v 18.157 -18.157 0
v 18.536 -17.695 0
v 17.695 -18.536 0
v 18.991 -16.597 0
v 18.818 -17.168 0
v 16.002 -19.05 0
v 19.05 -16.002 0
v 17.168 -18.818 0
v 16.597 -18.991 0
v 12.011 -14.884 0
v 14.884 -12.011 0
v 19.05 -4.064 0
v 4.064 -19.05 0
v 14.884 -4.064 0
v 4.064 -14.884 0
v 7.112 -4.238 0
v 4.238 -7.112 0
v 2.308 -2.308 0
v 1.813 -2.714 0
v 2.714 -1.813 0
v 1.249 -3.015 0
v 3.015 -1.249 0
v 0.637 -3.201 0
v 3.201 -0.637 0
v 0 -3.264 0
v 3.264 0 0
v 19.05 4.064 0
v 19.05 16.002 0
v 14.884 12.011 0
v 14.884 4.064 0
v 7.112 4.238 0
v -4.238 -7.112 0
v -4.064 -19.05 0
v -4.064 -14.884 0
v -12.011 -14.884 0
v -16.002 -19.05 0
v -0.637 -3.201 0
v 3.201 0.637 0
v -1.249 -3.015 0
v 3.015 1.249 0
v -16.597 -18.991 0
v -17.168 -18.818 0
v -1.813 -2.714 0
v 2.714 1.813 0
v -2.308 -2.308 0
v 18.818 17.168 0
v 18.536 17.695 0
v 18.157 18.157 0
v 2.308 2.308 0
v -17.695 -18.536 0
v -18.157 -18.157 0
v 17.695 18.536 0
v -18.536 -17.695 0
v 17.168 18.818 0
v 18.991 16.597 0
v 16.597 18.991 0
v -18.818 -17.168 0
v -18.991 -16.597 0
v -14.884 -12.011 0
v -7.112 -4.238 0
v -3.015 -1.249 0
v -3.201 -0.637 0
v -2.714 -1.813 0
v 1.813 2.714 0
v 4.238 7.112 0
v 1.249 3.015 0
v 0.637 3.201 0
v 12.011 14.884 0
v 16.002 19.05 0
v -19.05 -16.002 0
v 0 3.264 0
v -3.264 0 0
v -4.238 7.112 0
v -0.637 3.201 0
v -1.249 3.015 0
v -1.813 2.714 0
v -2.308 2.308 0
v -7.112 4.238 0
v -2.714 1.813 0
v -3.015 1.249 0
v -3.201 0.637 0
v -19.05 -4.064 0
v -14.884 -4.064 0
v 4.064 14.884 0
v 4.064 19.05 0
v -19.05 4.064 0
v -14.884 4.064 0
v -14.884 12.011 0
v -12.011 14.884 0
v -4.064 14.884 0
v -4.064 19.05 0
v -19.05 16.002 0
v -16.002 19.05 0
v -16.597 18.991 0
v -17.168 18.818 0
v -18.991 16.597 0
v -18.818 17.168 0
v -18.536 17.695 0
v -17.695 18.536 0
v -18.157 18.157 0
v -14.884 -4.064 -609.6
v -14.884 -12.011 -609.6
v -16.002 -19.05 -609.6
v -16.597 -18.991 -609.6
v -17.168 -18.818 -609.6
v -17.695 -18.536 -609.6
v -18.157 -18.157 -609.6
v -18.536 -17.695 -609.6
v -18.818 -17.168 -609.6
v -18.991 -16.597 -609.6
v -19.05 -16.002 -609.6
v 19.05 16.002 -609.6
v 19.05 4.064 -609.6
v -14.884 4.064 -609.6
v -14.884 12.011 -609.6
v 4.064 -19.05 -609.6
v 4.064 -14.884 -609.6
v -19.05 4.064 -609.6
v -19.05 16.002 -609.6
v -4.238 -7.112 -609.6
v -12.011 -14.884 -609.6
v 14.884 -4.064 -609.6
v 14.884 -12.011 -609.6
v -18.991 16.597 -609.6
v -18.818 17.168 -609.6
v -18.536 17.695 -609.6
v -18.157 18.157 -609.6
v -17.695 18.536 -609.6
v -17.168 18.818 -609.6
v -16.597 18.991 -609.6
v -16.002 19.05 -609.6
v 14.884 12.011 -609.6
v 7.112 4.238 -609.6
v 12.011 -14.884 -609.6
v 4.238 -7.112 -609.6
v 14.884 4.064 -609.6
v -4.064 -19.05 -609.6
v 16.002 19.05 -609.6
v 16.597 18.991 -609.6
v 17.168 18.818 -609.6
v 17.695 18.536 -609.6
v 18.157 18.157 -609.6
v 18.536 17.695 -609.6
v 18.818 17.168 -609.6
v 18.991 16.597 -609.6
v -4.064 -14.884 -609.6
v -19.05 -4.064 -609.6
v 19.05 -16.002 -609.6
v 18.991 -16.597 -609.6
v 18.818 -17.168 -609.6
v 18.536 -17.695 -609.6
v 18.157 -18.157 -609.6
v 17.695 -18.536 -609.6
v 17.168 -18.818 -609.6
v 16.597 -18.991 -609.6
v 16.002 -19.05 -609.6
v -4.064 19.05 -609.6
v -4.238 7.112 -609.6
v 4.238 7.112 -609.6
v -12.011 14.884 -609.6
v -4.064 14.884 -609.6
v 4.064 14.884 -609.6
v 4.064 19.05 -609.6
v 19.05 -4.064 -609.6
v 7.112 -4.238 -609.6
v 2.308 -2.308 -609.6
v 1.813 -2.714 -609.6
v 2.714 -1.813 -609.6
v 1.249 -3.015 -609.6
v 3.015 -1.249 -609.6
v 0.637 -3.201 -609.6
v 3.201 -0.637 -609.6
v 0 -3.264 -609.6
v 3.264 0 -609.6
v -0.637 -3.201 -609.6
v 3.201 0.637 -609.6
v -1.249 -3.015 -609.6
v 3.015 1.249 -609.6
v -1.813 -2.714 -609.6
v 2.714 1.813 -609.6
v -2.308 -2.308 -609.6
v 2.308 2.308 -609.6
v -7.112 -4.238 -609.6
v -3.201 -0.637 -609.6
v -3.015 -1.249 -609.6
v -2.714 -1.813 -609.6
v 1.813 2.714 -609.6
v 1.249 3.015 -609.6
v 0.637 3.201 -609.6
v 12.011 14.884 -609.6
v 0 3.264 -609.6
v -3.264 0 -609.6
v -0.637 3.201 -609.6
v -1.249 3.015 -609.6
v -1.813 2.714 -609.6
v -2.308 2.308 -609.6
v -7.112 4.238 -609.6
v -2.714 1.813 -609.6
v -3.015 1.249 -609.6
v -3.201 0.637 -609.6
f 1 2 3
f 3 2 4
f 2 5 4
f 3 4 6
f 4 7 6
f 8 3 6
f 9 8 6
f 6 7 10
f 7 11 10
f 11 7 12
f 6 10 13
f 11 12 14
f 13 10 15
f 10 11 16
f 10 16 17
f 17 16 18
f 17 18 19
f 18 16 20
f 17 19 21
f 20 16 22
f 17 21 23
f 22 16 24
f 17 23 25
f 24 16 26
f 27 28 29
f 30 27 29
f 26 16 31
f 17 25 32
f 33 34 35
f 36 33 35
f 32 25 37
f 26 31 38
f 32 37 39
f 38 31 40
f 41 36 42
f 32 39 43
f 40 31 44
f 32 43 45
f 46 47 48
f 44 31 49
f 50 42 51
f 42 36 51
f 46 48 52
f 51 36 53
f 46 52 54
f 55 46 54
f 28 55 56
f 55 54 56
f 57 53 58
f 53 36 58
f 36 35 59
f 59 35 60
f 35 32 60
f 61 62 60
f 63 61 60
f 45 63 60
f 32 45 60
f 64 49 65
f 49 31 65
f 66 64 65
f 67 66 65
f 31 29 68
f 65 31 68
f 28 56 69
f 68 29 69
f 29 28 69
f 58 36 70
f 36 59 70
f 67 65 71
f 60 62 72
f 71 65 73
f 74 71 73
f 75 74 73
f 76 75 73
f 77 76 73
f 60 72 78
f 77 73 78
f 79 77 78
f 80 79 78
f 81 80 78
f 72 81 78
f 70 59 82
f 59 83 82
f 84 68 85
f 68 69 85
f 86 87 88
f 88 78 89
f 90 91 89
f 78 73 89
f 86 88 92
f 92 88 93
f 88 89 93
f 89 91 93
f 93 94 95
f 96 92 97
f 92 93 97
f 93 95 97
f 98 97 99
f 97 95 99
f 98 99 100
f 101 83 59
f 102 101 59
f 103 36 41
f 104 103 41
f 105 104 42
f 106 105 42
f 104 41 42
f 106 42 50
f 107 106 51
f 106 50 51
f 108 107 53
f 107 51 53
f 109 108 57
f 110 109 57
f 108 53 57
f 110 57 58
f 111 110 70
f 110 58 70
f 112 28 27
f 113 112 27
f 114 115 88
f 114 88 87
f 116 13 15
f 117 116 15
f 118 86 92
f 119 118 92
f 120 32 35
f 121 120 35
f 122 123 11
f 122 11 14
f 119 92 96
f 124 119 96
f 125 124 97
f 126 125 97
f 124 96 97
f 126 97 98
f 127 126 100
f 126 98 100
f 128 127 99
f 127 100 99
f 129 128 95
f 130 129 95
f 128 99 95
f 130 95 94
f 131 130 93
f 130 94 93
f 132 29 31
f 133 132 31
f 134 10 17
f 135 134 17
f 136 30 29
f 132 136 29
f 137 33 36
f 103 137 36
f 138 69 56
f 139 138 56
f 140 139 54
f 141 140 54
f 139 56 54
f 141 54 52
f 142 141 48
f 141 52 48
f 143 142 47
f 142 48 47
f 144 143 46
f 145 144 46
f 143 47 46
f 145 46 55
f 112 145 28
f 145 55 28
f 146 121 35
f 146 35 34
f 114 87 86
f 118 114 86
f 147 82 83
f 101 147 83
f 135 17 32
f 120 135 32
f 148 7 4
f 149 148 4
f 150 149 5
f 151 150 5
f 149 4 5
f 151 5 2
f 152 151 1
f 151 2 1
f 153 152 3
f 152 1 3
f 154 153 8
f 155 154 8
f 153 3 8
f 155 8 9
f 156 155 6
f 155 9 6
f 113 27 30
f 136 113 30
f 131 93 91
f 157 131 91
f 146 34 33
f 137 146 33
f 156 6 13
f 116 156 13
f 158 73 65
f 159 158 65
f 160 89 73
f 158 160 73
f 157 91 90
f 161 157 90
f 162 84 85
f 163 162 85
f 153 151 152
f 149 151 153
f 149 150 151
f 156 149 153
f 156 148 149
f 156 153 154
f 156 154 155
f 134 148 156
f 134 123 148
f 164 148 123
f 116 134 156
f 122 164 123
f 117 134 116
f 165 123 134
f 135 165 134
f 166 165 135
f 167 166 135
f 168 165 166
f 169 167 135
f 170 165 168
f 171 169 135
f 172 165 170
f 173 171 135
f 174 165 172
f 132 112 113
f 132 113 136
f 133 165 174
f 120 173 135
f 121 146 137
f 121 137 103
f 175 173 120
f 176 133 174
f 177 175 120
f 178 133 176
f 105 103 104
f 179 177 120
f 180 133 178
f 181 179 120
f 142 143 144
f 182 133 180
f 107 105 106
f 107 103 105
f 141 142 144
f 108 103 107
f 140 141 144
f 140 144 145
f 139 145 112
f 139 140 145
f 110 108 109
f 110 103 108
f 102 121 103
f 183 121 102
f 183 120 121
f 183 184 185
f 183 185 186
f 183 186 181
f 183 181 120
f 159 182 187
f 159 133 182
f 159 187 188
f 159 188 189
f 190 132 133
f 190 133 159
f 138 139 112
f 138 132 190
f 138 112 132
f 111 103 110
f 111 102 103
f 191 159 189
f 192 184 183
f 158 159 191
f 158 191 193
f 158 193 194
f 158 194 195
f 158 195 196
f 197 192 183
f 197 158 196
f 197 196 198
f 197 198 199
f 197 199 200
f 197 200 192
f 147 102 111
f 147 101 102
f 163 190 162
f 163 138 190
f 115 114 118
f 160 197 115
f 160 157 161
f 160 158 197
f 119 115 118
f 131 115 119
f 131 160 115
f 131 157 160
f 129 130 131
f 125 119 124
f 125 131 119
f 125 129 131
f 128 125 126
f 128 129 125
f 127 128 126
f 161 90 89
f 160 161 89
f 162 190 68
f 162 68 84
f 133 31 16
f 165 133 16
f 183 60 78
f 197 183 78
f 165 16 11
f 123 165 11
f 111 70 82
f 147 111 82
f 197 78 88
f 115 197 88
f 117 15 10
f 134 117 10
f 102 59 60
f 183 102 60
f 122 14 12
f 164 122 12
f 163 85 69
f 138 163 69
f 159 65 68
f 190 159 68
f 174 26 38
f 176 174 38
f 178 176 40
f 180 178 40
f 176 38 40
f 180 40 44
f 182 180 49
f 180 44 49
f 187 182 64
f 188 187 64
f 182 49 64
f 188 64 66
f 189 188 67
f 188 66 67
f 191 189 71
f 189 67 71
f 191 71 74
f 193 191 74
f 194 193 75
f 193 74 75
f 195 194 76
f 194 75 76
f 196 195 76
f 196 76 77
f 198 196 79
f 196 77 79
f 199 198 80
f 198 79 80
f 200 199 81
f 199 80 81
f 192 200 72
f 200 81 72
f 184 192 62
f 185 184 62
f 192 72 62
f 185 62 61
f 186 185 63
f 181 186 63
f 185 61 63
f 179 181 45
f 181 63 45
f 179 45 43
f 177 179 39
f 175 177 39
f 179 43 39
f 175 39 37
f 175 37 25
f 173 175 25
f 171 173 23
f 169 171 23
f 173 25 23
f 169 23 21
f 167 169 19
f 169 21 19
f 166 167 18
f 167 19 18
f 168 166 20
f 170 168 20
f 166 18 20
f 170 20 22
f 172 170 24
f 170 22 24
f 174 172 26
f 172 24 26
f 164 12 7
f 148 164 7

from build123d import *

# Parameters (mm, degrees)
SKETCH1_R      = 3.2639
FINALCUT_DEPTH = 609.6


with BuildPart() as part:
    # Sketch1 → FinalCut (new body)
    with BuildSketch(Plane.XY):
        with BuildLine():
            Line((-7.112, 0), (-7.112, 4.238318041))
            Line((-7.112, 4.238318041), (-14.8844, 12.010718041))
            Line((-14.8844, 12.010718041), (-14.8844, 4.064))
            Line((-14.8844, 4.064), (-19.05, 4.064))
            Line((-19.05, 4.064), (-19.05, 16.002))
            ThreePointArc((-19.05, 16.002), (-18.157261469, 18.157261469), (-16.002, 19.05))
            Line((-16.002, 19.05), (-4.064, 19.05))
            Line((-4.064, 19.05), (-4.064, 14.8844))
            Line((-4.064, 14.8844), (-12.010718041, 14.8844))
            Line((-12.010718041, 14.8844), (-4.238318041, 7.112))
            Line((-4.238318041, 7.112), (0, 7.112))
            Line((0, 7.112), (4.238318041, 7.112))
            Line((4.238318041, 7.112), (12.010718041, 14.8844))
            Line((12.010718041, 14.8844), (4.064, 14.8844))
            Line((4.064, 14.8844), (4.064, 19.05))
            Line((4.064, 19.05), (16.002, 19.05))
            ThreePointArc((16.002, 19.05), (18.157261469, 18.157261469), (19.05, 16.002))
            Line((19.05, 16.002), (19.05, 4.064))
            Line((19.05, 4.064), (14.8844, 4.064))
            Line((14.8844, 4.064), (14.8844, 12.010718041))
            Line((14.8844, 12.010718041), (7.112, 4.238318041))
            Line((7.112, 4.238318041), (7.112, 0))
            Line((7.112, 0), (7.112, -4.238318041))
            Line((7.112, -4.238318041), (14.8844, -12.010718041))
            Line((14.8844, -12.010718041), (14.8844, -4.064))
            Line((14.8844, -4.064), (19.05, -4.064))
            Line((19.05, -4.064), (19.05, -16.002))
            ThreePointArc((19.05, -16.002), (18.157261469, -18.157261469), (16.002, -19.05))
            Line((16.002, -19.05), (4.064, -19.05))
            Line((4.064, -19.05), (4.064, -14.8844))
            Line((4.064, -14.8844), (12.010718041, -14.8844))
            Line((12.010718041, -14.8844), (4.238318041, -7.112))
            Line((4.238318041, -7.112), (0, -7.112))
            Line((0, -7.112), (-4.238318041, -7.112))
            Line((-4.238318041, -7.112), (-12.010718041, -14.8844))
            Line((-12.010718041, -14.8844), (-4.064, -14.8844))
            Line((-4.064, -14.8844), (-4.064, -19.05))
            Line((-4.064, -19.05), (-16.002, -19.05))
            ThreePointArc((-16.002, -19.05), (-18.157261469, -18.157261469), (-19.05, -16.002))
            Line((-19.05, -16.002), (-19.05, -4.064))
            Line((-19.05, -4.064), (-14.8844, -4.064))
            Line((-14.8844, -4.064), (-14.8844, -12.010718041))
            Line((-14.8844, -12.010718041), (-7.112, -4.238318041))
            Line((-7.112, -4.238318041), (-7.112, 0))
        make_face()
        Circle(SKETCH1_R, mode=Mode.SUBTRACT)
    extrude(amount=-FINALCUT_DEPTH)


solid = part.part
